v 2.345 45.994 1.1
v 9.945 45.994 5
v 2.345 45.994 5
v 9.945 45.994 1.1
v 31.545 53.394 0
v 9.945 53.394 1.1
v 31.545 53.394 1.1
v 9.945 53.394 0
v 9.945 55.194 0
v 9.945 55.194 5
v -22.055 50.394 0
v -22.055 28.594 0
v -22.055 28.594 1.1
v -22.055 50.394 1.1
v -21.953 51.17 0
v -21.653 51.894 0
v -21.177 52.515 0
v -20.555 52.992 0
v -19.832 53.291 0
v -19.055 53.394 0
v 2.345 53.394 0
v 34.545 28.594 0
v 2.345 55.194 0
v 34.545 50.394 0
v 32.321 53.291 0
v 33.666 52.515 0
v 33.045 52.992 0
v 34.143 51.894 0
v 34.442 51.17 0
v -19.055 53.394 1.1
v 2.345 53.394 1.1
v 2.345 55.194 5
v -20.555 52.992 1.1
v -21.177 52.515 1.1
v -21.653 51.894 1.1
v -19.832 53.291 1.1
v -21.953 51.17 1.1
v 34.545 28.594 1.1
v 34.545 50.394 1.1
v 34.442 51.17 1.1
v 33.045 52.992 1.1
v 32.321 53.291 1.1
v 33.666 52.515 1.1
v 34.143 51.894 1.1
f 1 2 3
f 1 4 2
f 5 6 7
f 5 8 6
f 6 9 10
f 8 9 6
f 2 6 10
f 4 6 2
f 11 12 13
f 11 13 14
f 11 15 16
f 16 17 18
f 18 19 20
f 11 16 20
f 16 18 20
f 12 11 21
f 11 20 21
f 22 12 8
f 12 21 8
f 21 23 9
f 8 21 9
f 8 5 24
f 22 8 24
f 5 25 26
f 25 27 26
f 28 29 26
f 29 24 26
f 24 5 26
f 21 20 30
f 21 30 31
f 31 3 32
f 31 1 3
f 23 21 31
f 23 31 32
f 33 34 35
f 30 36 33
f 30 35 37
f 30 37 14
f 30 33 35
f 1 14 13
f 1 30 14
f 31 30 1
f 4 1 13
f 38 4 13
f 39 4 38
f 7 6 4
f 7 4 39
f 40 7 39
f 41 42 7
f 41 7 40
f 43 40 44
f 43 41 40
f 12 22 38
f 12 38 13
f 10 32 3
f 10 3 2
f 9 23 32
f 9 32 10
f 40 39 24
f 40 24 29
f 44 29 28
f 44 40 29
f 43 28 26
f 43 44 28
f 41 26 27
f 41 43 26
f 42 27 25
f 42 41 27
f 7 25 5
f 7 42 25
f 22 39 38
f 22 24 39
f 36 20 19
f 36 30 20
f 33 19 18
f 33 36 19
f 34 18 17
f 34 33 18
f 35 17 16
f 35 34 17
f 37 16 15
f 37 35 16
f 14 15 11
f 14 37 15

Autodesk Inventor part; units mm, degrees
ref_plane "YZ Plane" through (0, 0, 0) normal (1, 0, 0) x (0, 1, 0)
ref_plane "XZ Plane" through (0, 0, 0) normal (0, 1, 0) x (-1, 0, 0)
ref_plane "XY Plane" through (0, 0, 0) normal (0, 0, 1) x (1, 0, 0)
sketch "Sketch1: PCB" plane through (0, 0, 0) normal (0, 0, 1) x (1, 0, 0)
  line L0 (-22.0554, 53.3935) -> (34.5446, 53.3935)
  line L1 (34.5446, 53.3935) -> (34.5446, 28.5935)
  line L2 (34.5446, 28.5935) -> (-22.0554, 28.5935)
  line L3 (-22.0554, 28.5935) -> (-22.0554, 53.3935)
  line L4 (2.3446, 55.1935) -> (9.9446, 55.1935)
  line L5 (9.9446, 55.1935) -> (9.9446, 45.9935)
  line L6 (9.9446, 45.9935) -> (2.3446, 45.9935)
  line L7 (2.3446, 45.9935) -> (2.3446, 55.1935)
  point P0 (0, 0)
  dimension "d0" = 56.6
  dimension "d1" = 24.8
  dimension "d2" = 7.6
  dimension "d4" = 9.2
  dimension "d7" = 1.8
  dimension "d13" = 32
extrude "Extrusion1" add sketch "Sketch1: PCB" along normal blind 1.1 contours L0 L7 L6 L5 L1 L2 L3 | L0 L5 L6 L7
extrude "Extrusion2" add sketch "Sketch1: PCB" along normal blind 5 contours L7 L4 L5 L0 | L0 L5 L6 L7
fillet "Fillet1" radius 3 2 edges at (-22.0554, 53.3935, 0.55) (34.5446, 53.3935, 0.55)
properties part number "PCB"
